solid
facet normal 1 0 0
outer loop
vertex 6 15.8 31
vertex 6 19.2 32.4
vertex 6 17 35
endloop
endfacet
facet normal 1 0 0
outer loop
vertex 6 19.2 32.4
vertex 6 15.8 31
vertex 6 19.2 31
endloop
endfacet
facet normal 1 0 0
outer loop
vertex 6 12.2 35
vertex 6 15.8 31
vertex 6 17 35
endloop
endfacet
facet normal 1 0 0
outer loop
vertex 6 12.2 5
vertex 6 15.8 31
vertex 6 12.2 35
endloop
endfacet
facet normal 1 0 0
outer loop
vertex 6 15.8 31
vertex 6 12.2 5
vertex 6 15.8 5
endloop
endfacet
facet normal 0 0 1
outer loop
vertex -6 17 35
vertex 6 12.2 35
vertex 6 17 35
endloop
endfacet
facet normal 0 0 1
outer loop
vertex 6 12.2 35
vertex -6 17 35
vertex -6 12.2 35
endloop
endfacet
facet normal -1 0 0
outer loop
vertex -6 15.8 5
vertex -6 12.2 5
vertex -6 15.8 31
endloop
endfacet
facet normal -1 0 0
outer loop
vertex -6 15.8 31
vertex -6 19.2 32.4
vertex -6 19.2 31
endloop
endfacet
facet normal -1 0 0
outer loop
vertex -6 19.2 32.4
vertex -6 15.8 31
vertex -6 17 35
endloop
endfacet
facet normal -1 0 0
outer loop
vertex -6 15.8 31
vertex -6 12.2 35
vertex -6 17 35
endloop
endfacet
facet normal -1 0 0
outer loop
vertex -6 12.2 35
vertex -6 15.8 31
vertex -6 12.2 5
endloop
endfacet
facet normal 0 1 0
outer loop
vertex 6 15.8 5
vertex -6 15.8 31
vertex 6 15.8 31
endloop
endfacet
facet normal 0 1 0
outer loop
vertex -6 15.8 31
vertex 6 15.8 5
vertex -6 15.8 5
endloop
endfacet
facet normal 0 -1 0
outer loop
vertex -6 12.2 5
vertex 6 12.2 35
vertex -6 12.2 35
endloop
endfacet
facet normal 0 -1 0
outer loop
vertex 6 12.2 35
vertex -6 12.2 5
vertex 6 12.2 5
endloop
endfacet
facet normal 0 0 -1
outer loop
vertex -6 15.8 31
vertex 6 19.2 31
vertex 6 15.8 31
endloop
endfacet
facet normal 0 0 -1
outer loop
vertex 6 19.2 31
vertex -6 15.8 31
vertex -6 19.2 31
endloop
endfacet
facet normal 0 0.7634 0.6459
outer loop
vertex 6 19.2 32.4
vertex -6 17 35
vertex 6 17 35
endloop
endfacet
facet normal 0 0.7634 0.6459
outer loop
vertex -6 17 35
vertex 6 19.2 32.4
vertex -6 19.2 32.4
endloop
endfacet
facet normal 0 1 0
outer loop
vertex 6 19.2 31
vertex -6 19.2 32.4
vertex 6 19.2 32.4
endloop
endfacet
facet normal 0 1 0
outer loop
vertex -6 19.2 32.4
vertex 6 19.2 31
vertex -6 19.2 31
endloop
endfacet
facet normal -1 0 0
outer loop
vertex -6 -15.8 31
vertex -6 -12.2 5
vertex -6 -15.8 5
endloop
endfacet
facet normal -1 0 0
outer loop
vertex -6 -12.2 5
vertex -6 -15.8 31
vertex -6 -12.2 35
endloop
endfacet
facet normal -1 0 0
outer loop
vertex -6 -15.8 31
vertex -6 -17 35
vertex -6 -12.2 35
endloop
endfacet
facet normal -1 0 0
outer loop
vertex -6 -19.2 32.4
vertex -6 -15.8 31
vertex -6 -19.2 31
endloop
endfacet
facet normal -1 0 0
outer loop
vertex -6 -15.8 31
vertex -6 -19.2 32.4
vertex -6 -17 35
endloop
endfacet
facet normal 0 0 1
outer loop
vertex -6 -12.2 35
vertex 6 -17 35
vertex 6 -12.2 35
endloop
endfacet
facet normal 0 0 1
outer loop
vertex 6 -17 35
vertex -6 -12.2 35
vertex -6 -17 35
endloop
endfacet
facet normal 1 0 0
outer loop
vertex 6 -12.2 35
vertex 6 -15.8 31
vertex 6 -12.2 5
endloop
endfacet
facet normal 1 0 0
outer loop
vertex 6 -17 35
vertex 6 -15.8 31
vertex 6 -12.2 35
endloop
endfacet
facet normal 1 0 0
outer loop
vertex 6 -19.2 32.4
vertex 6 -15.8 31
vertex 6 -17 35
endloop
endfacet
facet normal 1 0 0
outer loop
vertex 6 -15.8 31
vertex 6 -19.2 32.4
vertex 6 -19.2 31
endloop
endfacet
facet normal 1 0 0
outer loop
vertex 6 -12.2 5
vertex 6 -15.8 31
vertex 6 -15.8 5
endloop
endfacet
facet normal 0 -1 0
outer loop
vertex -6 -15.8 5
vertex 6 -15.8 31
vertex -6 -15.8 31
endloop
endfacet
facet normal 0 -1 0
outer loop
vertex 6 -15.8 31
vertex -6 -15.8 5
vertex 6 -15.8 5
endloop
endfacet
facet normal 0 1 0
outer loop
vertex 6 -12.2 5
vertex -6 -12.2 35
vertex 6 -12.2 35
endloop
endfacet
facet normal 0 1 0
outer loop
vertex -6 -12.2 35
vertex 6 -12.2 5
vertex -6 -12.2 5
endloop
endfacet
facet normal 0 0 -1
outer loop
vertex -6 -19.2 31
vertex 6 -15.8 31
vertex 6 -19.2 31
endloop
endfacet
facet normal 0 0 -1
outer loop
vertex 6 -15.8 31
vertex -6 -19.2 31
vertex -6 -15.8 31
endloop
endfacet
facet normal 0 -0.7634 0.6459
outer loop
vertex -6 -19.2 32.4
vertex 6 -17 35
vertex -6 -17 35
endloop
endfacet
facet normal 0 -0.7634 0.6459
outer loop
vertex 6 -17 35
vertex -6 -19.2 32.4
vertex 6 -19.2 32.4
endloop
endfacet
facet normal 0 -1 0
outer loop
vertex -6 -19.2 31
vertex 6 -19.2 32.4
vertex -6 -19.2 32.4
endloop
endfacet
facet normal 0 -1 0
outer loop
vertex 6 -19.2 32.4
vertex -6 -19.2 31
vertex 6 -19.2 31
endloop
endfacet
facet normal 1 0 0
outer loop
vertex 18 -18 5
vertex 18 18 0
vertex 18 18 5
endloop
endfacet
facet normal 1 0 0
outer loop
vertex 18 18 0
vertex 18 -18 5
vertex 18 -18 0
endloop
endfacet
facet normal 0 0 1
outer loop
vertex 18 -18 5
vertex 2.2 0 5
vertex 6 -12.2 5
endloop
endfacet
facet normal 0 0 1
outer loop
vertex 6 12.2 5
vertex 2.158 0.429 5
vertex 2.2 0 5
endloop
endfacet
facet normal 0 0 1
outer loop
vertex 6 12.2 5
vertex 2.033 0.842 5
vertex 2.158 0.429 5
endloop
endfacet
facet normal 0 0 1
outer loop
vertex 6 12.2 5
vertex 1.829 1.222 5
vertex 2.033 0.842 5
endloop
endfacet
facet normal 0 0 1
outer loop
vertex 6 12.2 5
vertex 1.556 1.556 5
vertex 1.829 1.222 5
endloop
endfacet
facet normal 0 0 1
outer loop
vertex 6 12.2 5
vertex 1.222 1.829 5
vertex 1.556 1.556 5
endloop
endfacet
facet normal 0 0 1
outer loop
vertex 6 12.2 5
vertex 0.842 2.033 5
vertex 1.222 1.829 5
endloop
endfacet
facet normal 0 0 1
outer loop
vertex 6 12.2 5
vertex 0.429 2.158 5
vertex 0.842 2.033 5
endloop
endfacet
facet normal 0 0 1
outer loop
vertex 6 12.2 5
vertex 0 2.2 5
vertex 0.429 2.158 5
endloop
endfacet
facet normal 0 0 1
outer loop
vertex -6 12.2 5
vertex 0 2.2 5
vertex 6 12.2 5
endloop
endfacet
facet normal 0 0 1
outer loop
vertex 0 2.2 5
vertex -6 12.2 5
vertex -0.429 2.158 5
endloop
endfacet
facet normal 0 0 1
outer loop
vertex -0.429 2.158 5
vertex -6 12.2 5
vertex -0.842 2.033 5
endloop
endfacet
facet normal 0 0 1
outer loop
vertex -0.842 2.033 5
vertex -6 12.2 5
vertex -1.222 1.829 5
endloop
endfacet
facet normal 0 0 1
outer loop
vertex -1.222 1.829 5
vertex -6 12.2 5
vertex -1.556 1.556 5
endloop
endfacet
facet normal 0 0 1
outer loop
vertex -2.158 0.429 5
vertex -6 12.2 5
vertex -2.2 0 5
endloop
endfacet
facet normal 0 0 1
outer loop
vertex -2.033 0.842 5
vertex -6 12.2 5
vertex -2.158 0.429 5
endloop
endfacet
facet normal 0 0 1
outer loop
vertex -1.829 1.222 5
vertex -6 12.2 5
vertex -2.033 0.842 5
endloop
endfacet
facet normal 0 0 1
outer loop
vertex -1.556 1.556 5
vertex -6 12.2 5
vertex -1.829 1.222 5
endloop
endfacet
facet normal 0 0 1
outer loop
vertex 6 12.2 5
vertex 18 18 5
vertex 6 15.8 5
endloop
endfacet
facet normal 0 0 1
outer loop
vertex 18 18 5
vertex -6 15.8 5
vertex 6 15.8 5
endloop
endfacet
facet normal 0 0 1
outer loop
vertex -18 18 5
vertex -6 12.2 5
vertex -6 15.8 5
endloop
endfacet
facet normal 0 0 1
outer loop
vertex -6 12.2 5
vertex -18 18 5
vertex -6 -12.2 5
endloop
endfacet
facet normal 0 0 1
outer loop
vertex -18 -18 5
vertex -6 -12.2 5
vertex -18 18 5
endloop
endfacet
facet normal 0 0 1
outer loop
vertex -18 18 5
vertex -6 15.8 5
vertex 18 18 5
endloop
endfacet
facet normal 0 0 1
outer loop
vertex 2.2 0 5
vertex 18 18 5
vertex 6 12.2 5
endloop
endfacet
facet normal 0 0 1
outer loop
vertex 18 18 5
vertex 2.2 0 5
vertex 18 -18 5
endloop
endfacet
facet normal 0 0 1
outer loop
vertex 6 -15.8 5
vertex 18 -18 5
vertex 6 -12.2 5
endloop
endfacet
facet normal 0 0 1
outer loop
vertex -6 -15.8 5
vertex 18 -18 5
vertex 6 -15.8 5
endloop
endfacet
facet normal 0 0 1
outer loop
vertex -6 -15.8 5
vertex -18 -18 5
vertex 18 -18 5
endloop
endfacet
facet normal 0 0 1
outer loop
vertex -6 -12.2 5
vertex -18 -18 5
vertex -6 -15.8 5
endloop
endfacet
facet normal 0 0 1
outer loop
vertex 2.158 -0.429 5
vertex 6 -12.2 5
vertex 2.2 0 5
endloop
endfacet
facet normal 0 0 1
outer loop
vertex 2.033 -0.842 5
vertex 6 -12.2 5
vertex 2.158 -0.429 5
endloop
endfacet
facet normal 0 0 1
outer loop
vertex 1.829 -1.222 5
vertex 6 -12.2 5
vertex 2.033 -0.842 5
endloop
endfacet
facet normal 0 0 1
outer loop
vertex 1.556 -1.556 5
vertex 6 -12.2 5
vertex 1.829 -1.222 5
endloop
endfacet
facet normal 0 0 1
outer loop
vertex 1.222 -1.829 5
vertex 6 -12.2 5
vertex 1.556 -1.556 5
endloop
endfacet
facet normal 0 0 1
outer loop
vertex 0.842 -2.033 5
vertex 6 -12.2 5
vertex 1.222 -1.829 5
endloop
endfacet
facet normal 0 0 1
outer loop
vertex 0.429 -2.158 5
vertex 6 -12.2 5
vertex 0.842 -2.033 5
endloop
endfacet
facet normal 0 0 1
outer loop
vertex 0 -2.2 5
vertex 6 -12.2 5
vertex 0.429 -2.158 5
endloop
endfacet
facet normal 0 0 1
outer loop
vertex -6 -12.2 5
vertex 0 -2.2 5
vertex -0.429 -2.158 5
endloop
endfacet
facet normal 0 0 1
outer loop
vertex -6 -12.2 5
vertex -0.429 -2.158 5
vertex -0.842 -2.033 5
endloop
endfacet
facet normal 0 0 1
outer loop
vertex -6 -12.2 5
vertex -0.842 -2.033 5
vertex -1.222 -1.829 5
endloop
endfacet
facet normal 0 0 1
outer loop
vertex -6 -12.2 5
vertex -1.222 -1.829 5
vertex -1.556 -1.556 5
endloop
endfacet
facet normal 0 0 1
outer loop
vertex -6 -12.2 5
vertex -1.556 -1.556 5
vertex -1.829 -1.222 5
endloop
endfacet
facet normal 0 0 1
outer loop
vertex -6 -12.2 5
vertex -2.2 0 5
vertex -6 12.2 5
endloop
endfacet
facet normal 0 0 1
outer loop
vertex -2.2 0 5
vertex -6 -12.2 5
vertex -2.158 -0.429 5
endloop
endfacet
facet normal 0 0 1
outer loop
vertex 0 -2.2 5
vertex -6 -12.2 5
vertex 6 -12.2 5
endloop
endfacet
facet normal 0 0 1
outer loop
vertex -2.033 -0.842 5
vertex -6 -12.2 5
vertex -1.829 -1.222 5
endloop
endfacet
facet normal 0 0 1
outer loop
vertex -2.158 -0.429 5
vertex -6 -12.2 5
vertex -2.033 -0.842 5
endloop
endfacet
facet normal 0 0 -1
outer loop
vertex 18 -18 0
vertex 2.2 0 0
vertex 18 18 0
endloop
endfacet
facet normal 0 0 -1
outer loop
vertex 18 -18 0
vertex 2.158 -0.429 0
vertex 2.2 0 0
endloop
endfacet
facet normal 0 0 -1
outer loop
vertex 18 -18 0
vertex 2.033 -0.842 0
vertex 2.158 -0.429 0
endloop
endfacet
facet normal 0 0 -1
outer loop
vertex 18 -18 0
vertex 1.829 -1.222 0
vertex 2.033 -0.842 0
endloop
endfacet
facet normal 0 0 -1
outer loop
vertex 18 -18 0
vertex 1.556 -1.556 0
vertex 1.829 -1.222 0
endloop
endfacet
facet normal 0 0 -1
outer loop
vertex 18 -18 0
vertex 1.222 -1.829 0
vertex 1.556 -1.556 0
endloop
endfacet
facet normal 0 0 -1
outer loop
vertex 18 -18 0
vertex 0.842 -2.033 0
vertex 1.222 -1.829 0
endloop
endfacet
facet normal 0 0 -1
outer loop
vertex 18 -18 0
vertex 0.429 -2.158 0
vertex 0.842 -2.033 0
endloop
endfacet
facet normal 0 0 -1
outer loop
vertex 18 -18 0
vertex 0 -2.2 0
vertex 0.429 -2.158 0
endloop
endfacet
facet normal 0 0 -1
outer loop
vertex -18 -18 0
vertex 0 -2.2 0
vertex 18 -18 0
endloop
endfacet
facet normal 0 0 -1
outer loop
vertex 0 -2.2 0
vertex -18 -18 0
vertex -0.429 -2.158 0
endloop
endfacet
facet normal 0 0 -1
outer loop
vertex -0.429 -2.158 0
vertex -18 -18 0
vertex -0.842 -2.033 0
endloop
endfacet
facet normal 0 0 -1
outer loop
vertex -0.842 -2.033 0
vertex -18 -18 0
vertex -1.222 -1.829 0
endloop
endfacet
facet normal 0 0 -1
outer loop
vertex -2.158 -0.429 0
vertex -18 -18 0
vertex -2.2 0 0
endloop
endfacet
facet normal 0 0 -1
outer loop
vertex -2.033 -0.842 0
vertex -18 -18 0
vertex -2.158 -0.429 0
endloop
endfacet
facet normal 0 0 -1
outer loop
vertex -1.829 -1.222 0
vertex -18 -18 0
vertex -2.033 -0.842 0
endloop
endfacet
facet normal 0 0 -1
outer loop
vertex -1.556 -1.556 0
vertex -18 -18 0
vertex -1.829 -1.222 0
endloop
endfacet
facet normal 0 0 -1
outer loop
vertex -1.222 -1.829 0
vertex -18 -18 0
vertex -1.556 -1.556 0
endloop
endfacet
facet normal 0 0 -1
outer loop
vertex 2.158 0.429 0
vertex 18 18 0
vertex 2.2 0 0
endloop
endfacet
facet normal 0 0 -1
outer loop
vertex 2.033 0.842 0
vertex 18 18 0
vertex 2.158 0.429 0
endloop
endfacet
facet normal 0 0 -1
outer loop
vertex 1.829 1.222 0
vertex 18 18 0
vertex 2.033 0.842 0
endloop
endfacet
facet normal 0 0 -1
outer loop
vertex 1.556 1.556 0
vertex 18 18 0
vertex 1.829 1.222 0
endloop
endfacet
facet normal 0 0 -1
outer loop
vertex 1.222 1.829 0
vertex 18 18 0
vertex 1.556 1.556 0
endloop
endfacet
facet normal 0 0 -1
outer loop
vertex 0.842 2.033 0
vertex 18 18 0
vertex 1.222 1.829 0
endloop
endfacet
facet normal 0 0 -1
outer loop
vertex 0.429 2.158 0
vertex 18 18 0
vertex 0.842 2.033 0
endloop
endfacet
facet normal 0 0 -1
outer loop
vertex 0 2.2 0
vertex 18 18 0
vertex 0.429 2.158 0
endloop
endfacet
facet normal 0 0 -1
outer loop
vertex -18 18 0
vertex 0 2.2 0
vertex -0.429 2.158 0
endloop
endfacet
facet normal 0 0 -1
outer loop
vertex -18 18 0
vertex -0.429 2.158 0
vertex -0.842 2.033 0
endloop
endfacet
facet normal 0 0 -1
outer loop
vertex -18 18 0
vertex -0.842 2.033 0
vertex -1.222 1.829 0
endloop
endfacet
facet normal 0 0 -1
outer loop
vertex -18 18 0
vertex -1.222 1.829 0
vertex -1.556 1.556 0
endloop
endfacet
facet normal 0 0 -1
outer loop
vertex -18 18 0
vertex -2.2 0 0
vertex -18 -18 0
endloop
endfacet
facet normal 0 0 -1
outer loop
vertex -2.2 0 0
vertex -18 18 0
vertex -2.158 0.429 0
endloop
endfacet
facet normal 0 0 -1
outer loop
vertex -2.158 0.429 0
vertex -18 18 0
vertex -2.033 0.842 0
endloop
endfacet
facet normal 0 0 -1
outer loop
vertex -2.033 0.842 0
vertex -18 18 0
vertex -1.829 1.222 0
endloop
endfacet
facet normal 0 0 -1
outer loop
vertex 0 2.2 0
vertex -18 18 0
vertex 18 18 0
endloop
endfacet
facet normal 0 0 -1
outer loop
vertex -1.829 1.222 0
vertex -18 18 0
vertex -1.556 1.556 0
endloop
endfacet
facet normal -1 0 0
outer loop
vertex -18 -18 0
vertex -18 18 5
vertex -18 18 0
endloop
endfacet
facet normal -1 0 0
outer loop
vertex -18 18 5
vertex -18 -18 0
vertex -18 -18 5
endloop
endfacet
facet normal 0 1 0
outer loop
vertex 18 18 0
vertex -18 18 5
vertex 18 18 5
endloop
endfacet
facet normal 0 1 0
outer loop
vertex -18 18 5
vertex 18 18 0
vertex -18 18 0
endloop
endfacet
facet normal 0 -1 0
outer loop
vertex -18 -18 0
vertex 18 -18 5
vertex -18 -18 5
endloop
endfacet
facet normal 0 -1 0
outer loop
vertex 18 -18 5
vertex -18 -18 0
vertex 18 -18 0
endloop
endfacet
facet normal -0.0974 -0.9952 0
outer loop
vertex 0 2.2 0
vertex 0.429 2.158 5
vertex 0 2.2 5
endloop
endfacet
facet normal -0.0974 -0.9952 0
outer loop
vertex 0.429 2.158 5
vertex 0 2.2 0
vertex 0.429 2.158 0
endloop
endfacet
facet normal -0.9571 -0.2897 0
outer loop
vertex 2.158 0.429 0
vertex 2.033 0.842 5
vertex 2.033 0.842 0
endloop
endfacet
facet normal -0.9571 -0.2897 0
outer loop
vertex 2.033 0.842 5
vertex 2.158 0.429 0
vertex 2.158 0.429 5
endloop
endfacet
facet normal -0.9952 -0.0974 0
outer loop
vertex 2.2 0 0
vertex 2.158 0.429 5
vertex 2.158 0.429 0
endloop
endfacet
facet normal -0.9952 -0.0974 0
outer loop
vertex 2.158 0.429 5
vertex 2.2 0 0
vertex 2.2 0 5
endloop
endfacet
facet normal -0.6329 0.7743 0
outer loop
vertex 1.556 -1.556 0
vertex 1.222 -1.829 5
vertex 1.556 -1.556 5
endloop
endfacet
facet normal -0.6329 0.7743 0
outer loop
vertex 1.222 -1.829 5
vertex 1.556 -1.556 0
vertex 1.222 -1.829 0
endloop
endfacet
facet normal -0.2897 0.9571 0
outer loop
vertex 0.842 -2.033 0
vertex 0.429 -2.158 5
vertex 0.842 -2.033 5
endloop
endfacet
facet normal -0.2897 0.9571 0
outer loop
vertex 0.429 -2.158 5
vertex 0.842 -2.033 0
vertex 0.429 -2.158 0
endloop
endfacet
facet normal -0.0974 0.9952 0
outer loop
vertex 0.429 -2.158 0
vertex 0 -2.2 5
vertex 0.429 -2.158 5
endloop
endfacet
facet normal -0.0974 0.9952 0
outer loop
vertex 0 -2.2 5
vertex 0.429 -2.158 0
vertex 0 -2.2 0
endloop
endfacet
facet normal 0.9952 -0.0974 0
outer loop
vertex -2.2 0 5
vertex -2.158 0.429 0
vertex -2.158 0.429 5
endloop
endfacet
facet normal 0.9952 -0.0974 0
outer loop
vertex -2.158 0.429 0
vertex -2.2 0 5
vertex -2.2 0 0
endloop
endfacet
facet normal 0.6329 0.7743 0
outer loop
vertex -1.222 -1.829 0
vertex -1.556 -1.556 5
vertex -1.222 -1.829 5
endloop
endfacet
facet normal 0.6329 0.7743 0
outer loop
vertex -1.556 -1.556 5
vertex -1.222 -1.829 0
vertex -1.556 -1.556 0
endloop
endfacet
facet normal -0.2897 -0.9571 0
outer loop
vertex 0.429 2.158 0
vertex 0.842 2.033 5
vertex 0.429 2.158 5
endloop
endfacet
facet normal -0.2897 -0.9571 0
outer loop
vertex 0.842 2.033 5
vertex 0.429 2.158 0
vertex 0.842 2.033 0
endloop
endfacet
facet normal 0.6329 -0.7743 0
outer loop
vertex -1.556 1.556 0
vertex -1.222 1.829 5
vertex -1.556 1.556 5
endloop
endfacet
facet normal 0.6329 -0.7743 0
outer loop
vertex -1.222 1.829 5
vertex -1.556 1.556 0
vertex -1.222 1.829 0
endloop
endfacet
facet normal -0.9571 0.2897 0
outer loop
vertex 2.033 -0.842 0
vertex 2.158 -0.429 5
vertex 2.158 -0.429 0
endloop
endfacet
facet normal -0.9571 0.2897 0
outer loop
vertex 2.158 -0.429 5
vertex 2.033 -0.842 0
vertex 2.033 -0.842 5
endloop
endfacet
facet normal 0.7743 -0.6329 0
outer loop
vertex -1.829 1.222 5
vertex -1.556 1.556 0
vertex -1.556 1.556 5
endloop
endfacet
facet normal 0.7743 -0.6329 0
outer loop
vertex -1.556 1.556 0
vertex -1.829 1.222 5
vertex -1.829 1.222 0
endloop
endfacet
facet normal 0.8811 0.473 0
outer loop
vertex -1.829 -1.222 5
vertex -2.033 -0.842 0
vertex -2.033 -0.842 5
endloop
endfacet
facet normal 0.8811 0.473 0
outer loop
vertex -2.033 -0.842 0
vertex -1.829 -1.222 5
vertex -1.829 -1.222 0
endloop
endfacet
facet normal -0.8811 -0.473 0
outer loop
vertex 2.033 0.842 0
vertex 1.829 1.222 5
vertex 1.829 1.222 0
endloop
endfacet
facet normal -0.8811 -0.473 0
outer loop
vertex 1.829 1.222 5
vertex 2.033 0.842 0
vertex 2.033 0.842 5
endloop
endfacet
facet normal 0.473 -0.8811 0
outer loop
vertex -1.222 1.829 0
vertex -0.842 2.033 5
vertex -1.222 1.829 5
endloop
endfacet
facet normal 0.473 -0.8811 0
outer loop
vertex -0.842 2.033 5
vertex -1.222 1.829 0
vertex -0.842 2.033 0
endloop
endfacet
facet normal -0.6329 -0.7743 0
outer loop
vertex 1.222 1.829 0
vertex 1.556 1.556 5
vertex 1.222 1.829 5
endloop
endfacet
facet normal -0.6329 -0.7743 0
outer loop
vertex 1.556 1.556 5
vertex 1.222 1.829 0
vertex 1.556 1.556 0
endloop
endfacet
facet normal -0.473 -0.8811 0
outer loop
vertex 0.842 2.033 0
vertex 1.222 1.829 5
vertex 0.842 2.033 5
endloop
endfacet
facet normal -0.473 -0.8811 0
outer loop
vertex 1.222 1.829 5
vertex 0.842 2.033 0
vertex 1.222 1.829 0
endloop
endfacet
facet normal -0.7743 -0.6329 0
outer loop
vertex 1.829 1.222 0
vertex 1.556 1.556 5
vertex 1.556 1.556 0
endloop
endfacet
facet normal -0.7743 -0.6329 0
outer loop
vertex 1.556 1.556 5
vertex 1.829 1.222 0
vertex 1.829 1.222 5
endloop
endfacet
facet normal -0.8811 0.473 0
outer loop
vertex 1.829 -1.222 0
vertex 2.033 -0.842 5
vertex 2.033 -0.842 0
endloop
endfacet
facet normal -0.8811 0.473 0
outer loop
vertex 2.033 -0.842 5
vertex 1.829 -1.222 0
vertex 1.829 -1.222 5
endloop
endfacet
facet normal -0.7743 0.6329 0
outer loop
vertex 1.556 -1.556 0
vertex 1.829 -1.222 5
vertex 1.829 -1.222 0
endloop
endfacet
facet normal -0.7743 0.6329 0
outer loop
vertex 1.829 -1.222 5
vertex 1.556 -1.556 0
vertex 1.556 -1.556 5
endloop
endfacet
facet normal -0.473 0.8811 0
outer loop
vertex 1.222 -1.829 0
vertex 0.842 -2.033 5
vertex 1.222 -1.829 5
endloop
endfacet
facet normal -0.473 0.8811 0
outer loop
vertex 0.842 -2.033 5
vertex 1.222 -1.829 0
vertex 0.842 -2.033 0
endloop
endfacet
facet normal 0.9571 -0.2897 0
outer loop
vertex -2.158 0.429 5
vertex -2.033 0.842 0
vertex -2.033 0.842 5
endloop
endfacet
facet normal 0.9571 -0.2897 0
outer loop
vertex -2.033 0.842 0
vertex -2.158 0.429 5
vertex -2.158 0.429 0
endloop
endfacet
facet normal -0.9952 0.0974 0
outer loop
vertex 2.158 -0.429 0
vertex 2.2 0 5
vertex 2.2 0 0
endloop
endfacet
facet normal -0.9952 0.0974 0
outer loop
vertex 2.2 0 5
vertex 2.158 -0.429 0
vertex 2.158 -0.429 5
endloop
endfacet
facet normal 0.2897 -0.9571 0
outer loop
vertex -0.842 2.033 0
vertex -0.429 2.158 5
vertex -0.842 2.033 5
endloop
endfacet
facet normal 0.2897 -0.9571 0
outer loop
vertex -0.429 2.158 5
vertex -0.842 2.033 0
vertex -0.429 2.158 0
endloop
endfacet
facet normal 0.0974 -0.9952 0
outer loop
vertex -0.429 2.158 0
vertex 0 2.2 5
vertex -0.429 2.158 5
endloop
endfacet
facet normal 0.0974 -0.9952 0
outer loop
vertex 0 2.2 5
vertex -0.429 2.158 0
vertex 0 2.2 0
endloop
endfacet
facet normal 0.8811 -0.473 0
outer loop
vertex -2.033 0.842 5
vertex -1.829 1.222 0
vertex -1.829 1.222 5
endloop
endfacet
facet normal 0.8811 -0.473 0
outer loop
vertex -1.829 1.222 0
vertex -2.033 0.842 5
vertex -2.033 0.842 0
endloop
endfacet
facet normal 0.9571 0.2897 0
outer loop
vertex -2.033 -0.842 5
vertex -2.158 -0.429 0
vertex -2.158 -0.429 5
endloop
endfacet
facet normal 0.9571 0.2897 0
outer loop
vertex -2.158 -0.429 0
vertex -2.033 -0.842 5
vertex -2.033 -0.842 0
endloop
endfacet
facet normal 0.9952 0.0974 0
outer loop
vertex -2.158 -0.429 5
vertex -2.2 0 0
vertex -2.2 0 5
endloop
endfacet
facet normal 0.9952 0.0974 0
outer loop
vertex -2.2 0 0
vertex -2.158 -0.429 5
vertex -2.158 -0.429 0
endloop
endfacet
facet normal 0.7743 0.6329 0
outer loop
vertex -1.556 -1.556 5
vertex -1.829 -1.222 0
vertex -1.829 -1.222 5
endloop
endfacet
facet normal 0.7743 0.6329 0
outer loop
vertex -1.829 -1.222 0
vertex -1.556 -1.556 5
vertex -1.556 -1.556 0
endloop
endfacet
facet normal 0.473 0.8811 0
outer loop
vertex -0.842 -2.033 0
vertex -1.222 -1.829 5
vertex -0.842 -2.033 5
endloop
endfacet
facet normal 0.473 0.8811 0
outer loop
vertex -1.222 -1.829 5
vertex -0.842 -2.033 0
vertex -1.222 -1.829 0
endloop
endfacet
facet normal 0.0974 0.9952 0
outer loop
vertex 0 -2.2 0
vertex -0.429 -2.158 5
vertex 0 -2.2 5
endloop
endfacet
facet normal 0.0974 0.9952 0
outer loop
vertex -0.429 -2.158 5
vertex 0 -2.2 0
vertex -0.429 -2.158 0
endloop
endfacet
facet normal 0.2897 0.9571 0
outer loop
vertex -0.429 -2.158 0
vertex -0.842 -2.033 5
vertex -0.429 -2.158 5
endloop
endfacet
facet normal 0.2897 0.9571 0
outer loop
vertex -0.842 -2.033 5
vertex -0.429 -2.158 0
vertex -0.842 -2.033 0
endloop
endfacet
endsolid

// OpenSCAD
$fn = 32;

// ----------------------------------------------------------------------
// Snap-fit latch: 2 arms, 30 mm tall, 3.6 mm undercut hooks
// ----------------------------------------------------------------------

// --- parameters (mm) ---
base_d = 36;              // base plate depth
base_h = 5;               // base plate thickness
span = 28;                // distance between opposite arms
arm_t = 3.6;              // arm thickness
arm_d = 12;               // arm width
height = 30;              // free arm length
head_len = 3.6;           // hook reach
head_h = 4;               // hook height
lead = 1.4;               // lead-in ramp thickness
bore_d = 4.4;             // base fixing bore
top_z = 35;               // height of the arm tips above the base

arms = 2;

difference() {
  union() {
    /* base plate, centred on the arm ring */
    translate([-18, -18, 0]) cube([base_d, base_d, base_h]);
    for (a = [0 : 360 / arms : 359]) rotate([0, 0, a]) {
    /* arm, sunk 0.5 mm into the base */
    translate([-arm_d / 2, span / 2 - arm_t / 2, base_h - 0.5]) cube([arm_d, arm_t, height + 0.5]);
    /* hook: a convex hull of a tall inner block and a thin outer lip
       gives a flat undercut below and a lead-in ramp on top */
    hull() {
      translate([-arm_d / 2, span / 2 + arm_t / 2 - 0.6, top_z - head_h]) cube([arm_d, lead + 0.4, head_h]);
      translate([-arm_d / 2, span / 2 + arm_t / 2 - 0.2, top_z - head_h]) cube([arm_d, head_len, lead]);
    }
    }
  }
  translate([0, 0, -2.5]) cylinder(h = base_h + 5, d = bore_d);
}
